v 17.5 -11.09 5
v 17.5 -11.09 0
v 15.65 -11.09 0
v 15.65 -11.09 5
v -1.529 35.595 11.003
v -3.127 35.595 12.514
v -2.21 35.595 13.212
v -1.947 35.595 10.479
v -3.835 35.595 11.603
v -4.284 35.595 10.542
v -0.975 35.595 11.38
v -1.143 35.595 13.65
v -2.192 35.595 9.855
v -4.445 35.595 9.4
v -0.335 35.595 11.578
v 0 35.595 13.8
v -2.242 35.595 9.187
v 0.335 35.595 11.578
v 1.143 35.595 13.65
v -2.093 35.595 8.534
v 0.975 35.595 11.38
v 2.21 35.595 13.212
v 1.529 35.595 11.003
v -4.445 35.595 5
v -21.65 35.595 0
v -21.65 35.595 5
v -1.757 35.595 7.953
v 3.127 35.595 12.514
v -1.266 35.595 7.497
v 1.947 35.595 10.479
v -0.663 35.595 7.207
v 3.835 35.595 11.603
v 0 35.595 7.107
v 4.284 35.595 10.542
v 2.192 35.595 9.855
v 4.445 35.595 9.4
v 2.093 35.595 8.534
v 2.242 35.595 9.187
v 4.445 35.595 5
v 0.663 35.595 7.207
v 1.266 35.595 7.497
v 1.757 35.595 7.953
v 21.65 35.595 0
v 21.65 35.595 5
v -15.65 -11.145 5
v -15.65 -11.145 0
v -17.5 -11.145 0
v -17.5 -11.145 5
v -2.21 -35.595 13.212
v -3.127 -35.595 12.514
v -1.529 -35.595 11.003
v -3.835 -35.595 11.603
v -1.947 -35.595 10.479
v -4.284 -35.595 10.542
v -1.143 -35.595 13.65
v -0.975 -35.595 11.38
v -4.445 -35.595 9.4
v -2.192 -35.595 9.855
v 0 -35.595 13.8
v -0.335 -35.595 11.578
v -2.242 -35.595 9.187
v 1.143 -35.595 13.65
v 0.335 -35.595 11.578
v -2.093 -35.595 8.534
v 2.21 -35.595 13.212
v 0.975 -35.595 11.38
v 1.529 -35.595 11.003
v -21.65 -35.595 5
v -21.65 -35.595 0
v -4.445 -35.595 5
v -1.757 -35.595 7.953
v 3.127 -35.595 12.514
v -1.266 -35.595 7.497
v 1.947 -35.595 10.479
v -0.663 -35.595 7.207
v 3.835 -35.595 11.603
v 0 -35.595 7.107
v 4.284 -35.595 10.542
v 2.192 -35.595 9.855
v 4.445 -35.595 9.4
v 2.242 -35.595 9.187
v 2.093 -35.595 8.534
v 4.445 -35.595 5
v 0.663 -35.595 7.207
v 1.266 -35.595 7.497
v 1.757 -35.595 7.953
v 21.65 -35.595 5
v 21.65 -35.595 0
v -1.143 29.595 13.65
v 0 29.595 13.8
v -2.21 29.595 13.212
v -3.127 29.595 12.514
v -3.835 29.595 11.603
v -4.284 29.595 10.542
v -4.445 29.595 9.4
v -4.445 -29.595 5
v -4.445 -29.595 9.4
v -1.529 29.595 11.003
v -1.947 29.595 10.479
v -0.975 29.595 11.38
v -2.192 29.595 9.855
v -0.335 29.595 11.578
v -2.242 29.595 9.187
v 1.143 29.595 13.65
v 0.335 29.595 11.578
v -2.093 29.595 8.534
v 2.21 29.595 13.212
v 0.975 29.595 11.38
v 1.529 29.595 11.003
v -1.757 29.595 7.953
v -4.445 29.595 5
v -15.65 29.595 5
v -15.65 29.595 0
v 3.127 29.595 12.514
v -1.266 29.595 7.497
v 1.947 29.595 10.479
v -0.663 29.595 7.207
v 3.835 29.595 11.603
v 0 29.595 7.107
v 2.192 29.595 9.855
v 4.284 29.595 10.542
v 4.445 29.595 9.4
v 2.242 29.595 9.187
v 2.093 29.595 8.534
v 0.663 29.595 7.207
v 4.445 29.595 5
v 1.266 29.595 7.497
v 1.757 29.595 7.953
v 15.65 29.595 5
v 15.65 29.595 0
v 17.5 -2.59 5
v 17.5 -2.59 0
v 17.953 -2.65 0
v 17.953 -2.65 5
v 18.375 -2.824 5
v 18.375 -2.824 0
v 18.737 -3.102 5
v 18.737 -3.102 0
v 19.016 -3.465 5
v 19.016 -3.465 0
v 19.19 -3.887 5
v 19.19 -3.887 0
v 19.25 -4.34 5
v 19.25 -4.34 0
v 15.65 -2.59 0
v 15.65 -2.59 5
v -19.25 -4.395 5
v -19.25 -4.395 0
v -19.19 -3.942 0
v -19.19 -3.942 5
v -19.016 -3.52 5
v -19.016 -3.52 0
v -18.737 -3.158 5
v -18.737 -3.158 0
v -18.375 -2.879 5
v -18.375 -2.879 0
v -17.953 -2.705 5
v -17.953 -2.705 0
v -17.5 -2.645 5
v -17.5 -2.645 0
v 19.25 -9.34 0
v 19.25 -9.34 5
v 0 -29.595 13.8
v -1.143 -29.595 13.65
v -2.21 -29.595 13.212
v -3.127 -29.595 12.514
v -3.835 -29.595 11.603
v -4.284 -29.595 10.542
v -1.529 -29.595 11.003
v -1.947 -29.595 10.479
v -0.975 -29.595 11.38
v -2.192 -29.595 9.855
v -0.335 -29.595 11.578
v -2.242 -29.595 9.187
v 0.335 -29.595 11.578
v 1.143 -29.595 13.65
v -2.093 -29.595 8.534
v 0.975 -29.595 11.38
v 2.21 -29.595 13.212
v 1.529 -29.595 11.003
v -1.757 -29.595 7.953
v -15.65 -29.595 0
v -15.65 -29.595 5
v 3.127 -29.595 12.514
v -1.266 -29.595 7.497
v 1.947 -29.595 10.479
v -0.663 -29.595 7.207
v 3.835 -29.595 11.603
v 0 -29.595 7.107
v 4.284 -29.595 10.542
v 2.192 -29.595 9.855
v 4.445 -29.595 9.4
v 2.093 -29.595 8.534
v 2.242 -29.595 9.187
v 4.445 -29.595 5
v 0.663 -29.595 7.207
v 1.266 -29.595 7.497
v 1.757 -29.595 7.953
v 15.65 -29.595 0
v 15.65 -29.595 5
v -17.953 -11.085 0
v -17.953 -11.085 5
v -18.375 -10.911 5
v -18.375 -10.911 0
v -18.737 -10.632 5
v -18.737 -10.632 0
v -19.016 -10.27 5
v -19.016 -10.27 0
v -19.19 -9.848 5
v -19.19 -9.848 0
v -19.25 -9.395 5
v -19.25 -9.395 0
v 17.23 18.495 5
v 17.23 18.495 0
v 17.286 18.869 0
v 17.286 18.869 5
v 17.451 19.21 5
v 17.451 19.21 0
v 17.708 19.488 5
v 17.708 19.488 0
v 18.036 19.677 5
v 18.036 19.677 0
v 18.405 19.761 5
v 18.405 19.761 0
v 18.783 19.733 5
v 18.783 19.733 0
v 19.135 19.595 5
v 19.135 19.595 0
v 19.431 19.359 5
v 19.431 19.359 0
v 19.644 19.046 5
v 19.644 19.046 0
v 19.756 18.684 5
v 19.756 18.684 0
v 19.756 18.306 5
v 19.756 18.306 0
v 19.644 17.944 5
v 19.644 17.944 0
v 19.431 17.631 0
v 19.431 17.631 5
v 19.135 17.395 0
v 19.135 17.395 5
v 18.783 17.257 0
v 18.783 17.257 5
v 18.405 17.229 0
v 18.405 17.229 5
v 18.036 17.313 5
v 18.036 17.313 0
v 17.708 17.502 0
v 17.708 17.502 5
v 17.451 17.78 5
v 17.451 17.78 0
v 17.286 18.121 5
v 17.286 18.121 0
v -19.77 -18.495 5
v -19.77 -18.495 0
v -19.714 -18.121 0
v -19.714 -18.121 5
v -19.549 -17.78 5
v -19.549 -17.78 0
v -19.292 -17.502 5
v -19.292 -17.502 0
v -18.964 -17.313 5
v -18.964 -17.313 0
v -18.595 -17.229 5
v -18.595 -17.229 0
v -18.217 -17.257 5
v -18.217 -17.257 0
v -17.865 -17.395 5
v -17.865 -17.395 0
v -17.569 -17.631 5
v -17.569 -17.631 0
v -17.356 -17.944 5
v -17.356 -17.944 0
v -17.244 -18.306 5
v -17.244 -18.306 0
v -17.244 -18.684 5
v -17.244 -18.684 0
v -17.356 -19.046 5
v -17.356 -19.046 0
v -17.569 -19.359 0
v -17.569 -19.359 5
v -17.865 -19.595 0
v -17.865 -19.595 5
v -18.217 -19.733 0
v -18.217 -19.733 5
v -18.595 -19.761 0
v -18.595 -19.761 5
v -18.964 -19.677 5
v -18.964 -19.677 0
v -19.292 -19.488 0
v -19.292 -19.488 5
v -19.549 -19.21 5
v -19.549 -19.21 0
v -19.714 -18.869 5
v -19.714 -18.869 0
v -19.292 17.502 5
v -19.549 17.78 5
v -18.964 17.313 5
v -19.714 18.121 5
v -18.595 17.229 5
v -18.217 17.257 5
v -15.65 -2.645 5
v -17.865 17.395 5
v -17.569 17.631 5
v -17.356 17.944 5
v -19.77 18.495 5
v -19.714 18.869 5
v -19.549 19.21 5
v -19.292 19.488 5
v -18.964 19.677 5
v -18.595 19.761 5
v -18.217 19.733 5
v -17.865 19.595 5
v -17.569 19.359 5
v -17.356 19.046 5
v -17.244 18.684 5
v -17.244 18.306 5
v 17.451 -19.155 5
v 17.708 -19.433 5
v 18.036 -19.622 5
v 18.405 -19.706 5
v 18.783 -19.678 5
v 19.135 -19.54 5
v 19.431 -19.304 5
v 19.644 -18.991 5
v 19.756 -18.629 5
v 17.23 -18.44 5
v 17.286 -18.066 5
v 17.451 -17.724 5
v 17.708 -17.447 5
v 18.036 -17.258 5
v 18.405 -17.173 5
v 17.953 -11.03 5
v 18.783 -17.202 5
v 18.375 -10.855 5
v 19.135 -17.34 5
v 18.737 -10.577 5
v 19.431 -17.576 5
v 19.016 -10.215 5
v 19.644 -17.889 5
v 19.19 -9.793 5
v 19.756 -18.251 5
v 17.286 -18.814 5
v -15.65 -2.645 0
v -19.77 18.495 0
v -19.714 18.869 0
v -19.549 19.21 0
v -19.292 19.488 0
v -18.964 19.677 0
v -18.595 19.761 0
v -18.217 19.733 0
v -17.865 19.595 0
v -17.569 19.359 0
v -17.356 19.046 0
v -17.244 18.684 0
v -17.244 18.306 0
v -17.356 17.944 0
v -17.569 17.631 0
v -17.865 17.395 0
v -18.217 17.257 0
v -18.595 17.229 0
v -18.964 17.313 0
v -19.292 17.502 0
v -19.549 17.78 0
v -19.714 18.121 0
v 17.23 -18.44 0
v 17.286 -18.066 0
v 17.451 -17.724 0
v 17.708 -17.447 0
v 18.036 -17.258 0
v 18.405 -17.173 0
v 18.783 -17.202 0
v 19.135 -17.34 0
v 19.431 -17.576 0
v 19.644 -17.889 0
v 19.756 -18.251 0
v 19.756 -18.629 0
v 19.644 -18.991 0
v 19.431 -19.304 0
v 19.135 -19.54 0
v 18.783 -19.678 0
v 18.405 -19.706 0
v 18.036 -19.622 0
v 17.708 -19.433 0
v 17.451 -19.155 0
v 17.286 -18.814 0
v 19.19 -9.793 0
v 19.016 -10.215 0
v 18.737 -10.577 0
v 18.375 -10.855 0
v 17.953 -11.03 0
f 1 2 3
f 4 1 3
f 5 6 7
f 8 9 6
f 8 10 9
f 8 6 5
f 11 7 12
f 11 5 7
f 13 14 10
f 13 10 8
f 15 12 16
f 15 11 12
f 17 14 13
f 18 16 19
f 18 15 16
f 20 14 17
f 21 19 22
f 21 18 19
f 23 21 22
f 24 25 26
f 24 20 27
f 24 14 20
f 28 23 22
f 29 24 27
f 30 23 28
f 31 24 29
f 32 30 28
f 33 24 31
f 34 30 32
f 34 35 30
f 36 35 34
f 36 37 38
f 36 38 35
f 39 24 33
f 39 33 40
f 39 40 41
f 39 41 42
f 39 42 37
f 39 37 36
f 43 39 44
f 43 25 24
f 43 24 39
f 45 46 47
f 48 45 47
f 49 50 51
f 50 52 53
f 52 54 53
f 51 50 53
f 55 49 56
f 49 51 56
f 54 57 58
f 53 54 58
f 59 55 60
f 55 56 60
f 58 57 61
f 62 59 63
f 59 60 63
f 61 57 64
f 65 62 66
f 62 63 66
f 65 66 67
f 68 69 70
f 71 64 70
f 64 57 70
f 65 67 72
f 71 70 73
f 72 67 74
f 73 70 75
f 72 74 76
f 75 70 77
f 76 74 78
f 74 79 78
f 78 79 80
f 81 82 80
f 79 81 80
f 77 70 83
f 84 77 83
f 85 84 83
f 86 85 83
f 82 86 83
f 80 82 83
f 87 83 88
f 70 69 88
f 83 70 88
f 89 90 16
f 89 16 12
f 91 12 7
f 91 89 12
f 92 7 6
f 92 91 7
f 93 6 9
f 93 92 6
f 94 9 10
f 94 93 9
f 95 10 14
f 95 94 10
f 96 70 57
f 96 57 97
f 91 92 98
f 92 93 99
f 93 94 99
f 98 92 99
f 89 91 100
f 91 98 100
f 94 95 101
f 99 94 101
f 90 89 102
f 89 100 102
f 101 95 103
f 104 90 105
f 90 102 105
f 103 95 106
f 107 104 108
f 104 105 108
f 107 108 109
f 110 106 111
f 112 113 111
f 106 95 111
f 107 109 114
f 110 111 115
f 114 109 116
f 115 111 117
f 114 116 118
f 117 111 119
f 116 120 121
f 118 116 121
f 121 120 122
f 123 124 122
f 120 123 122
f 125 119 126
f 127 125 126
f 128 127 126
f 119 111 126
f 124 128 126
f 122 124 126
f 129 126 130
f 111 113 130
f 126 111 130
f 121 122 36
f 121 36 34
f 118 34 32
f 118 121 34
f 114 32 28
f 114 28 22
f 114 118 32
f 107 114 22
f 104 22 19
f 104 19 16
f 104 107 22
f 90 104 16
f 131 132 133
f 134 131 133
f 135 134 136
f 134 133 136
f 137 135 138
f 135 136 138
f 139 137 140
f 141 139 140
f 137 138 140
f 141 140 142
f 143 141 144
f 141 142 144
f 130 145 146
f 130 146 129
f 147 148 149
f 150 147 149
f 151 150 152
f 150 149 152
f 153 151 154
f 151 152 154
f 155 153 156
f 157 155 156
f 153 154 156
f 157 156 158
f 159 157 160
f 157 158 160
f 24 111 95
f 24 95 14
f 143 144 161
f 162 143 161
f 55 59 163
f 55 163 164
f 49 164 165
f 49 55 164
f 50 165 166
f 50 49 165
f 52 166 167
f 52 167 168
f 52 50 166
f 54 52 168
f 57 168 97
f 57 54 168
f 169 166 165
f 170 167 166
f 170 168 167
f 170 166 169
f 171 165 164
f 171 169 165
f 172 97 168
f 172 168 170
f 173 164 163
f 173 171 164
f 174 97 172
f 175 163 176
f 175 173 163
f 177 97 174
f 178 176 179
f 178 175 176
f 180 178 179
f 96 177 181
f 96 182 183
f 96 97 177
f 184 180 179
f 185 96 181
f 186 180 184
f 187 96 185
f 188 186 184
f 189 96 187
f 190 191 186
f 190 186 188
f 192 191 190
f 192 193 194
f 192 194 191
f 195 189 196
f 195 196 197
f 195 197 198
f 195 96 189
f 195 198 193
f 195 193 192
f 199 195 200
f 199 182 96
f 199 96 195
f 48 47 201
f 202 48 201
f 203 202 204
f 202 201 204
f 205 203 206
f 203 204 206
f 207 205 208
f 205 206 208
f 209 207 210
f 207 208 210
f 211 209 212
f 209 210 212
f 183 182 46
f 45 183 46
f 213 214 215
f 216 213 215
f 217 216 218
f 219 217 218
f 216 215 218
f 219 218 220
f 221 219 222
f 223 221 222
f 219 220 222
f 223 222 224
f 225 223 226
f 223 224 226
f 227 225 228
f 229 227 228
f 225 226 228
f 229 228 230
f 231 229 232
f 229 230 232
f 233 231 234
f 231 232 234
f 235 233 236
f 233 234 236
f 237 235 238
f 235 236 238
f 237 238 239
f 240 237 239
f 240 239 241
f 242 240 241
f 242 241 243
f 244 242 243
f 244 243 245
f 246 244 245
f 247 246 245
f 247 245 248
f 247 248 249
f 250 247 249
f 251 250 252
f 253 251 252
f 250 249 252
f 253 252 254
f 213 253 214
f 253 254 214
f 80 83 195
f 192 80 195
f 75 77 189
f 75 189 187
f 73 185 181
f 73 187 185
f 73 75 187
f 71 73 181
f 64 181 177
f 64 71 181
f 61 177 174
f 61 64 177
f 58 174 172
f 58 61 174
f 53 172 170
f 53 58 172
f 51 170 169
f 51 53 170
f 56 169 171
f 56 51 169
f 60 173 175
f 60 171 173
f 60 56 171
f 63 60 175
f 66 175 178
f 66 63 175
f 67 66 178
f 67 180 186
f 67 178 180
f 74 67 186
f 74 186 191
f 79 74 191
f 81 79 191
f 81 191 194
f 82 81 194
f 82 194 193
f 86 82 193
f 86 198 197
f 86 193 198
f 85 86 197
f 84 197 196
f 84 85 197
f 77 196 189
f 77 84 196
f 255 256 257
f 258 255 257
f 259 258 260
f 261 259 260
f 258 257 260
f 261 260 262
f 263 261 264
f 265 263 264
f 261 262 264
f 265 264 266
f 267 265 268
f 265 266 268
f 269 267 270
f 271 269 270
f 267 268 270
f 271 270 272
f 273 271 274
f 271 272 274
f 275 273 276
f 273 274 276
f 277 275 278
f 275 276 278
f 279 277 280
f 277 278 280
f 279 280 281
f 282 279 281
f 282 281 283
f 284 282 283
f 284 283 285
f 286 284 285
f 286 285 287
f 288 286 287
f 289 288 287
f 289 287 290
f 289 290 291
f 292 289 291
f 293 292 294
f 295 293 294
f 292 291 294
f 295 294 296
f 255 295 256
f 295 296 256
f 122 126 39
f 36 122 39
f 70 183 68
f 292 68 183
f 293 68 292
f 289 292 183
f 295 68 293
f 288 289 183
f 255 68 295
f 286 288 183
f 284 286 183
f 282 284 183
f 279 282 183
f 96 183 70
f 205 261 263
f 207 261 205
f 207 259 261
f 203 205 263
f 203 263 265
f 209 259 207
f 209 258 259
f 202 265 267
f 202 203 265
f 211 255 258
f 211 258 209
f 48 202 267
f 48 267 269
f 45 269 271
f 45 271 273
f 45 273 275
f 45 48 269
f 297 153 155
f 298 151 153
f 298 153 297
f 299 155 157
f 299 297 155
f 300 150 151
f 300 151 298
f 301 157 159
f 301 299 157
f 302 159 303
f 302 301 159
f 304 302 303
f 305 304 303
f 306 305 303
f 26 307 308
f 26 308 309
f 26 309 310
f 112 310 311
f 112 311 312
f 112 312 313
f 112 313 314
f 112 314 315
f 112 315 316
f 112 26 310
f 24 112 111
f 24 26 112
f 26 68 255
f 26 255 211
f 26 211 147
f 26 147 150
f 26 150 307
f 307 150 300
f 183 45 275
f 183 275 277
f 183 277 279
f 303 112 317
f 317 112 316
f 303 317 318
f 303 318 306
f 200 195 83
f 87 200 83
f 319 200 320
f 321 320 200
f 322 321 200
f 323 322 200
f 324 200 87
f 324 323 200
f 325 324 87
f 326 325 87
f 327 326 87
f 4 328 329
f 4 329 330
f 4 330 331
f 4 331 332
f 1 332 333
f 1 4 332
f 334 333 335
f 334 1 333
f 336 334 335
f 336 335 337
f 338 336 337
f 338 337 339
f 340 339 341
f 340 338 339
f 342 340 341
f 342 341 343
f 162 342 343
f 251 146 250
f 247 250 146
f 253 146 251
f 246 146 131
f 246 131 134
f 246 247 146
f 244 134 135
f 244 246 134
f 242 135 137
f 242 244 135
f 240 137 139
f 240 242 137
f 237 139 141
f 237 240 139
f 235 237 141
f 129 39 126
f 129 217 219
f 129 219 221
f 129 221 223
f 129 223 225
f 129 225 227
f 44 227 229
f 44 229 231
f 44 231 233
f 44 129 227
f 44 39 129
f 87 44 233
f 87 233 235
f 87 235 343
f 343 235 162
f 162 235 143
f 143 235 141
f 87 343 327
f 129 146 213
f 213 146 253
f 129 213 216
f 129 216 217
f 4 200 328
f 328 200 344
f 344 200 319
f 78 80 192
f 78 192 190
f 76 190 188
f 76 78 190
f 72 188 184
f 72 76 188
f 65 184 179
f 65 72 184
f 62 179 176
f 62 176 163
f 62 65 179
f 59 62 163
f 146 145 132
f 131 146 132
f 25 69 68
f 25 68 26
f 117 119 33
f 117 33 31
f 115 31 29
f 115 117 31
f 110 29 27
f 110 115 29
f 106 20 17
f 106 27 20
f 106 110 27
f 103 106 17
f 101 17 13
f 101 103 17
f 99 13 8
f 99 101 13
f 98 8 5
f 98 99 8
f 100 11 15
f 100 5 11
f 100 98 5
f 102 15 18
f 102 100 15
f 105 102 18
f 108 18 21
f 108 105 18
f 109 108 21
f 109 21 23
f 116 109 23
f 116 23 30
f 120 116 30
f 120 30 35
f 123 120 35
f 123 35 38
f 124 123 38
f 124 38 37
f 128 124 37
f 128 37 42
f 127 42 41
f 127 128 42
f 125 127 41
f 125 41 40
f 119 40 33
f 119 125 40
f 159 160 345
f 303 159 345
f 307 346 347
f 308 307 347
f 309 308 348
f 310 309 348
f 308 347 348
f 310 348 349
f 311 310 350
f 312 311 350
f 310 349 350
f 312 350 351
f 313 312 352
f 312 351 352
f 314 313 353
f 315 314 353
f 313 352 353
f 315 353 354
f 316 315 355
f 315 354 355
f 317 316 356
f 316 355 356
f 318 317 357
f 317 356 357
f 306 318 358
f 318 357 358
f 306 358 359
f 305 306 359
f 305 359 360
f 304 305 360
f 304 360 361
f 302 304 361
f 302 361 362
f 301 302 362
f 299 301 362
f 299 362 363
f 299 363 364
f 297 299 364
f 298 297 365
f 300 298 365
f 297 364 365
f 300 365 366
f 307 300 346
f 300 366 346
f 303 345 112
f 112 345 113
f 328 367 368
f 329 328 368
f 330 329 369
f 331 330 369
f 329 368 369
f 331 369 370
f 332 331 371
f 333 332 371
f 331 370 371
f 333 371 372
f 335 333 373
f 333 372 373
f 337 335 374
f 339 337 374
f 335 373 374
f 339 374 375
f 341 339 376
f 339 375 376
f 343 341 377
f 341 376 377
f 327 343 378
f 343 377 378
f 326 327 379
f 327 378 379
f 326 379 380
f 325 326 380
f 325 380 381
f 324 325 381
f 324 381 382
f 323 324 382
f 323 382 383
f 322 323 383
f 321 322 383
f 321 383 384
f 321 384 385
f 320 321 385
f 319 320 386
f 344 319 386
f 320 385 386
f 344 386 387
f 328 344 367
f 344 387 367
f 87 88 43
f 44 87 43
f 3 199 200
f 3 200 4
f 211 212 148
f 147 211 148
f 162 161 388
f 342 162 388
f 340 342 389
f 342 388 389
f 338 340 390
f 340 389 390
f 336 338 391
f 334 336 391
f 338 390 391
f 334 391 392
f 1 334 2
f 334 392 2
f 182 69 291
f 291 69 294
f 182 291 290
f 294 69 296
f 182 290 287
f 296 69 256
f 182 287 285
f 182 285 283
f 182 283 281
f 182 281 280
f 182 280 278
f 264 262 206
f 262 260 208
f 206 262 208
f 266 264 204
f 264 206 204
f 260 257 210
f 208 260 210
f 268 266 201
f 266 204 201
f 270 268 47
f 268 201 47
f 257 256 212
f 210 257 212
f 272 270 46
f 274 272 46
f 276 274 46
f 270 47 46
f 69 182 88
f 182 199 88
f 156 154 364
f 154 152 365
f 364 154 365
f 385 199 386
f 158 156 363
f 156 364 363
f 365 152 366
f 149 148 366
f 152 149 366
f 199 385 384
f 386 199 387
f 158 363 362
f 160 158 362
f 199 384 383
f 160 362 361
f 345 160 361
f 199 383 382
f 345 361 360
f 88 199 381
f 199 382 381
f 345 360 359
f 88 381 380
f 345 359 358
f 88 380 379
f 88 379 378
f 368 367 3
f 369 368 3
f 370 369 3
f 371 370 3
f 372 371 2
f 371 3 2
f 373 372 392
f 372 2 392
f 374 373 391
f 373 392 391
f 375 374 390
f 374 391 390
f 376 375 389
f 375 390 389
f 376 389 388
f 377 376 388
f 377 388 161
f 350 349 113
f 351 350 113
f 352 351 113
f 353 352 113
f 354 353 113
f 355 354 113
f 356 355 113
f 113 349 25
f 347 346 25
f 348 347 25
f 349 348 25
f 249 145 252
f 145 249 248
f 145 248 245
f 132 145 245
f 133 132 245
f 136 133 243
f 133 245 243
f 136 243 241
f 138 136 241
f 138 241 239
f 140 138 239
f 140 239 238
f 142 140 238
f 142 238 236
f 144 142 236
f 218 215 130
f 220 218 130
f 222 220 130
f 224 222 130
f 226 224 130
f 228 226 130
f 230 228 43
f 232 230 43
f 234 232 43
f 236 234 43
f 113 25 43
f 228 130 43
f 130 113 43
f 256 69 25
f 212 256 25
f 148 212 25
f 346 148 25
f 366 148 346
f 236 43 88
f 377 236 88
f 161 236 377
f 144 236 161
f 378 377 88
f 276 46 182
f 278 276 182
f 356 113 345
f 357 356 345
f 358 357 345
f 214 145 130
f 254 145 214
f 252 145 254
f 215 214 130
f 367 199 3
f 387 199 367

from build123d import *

# Parameters (mm, degrees)
SKETCH2_W               = 43.3
SKETCH2_H               = 71.19
SKETCH2_W_2             = 31.3
SKETCH2_H_2             = 59.19
BOSS_EXTRUDE1_DEPTH     = 5
SKETCH3_W               = 8.89
SKETCH3_H               = 6
BOSS_EXTRUDE2_DEPTH     = 8.8
CUT_EXTRUDE1_DEPTH      = 76.678124977
CUT_EXTRUDE1_DEPTH_BACK = 76.678124977
SKETCH5_R               = 2.2479
SKETCH6_R               = 1.75
SKETCH6_R_2             = 1.27
CUT_EXTRUDE2_DEPTH      = 5


with BuildPart() as part:
    # Sketch2 → Boss-Extrude1 (new body)
    with BuildSketch(Plane.XY):
        Rectangle(SKETCH2_W, SKETCH2_H)
        Rectangle(SKETCH2_W_2, SKETCH2_H_2, mode=Mode.SUBTRACT)
    extrude(amount=BOSS_EXTRUDE1_DEPTH)

    # Sketch3 → Boss-Extrude2 (add)
    with BuildSketch(Plane.XY.offset(5)):
        with Locations((0, 32.595)):
            Rectangle(SKETCH3_W, SKETCH3_H)
        with Locations((0, -32.595)):
            Rectangle(SKETCH3_W, SKETCH3_H)
    extrude(amount=BOSS_EXTRUDE2_DEPTH)

    # Sketch5 → Cut-Extrude1 (cut, two sides: drawn at the far end of the back side and taken through both)
    with BuildSketch(Plane(origin=(0, 35.595, 0), x_dir=(1, 0, 0), z_dir=(0, 1, 0)).offset(-CUT_EXTRUDE1_DEPTH_BACK)):
        with BuildLine():
            Line((-4.445, -13.8), (-2.8e-08, -13.8))
            ThreePointArc((-2.8e-08, -13.8), (-3.127220221, -12.513973022), (-4.445, -9.4))
            Line((-4.445, -9.4), (-4.445, -13.8))
        make_face()
        with BuildLine():
            Line((4.445, -13.8), (4.445, -9.4))
            ThreePointArc((4.445, -9.4), (3.127220202, -12.513973041), (-2.8e-08, -13.8))
            Line((-2.8e-08, -13.8), (4.445, -13.8))
        make_face()
        with Locations(Location((0, -9.354769886, 0), (0, 0, 90))):
            Circle(SKETCH5_R)
    extrude(amount=CUT_EXTRUDE1_DEPTH + CUT_EXTRUDE1_DEPTH_BACK, mode=Mode.SUBTRACT)

    # Sketch6 → Cut-Extrude2 (cut)
    with BuildSketch(Plane(origin=(0, 0, 0), x_dir=(-1, 0, 0), z_dir=(0, 0, -1))):
        with BuildLine():
            Line((-15.65, -2.589888065), (-17.5, -2.589888065))
            ThreePointArc((-17.5, -2.589888065), (-16.262563133, -3.102451197), (-15.75, -4.339888065))
            ThreePointArc((-15.75, -4.339888065), (-17.5, -6.089888065), (-19.25, -4.339888065))
            Line((-19.25, -4.339888065), (-19.25, -9.339888065))
            ThreePointArc((-19.25, -9.339888065), (-17.5, -7.589888065), (-15.75, -9.339888065))
            ThreePointArc((-15.75, -9.339888065), (-16.262563133, -10.577324932), (-17.5, -11.089888065))
            Line((-17.5, -11.089888065), (-15.65, -11.089888065))
            Line((-15.65, -11.089888065), (-15.65, -2.589888065))
        make_face()
        with Locations((-17.5, -4.339888065)):
            Circle(SKETCH6_R)
        with Locations((-17.5, -9.339888065)):
            Circle(SKETCH6_R)
        with Locations((17.5, -9.395)):
            Circle(SKETCH6_R)
        with BuildLine():
            ThreePointArc((19.25, -4.395), (16.262563133, -5.632436867), (17.5, -2.645))
            Line((17.5, -2.645), (15.65, -2.645))
            Line((15.65, -2.645), (15.65, -11.145))
            Line((15.65, -11.145), (17.5, -11.145))
            ThreePointArc((17.5, -11.145), (16.262563133, -8.157563133), (19.25, -9.395))
            Line((19.25, -9.395), (19.25, -4.395))
        make_face()
        with Locations((17.5, -4.395)):
            Circle(SKETCH6_R)
        with Locations((-18.5, 18.49499991)):
            Circle(SKETCH6_R_2)
        with Locations((18.5, 18.495)):
            Circle(SKETCH6_R_2)
        with Locations((18.5, -18.495)):
            Circle(SKETCH6_R_2)
        with Locations((-18.49999995, -18.439888065)):
            Circle(SKETCH6_R_2)
    extrude(amount=-CUT_EXTRUDE2_DEPTH, mode=Mode.SUBTRACT)


solid = part.part
